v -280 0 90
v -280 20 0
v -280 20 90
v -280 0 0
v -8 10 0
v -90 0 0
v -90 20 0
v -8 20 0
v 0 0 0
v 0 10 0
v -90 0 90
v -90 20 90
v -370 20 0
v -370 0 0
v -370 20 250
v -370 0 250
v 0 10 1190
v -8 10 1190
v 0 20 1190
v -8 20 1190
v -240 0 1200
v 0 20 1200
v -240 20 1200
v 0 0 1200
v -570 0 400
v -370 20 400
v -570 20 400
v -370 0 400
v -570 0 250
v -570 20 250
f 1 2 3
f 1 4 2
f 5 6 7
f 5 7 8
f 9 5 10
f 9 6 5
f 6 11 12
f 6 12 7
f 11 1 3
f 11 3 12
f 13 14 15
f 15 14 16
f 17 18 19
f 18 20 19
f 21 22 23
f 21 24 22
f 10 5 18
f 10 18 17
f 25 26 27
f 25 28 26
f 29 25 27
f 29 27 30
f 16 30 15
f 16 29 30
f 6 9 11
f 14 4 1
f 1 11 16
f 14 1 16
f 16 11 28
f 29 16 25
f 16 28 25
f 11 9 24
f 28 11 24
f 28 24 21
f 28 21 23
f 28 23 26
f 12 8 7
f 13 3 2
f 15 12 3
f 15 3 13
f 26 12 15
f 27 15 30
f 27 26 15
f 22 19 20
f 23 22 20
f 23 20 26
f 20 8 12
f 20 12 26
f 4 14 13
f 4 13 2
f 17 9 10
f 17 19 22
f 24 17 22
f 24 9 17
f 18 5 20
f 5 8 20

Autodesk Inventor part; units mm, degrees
ref_plane "YZ Plane" through (0, 0, 0) normal (1, 0, 0) x (0, 1, 0)
ref_plane "XZ Plane" through (0, 0, 0) normal (0, 1, 0) x (-1, 0, 0)
ref_plane "XY Plane" through (0, 0, 0) normal (0, 0, 1) x (1, 0, 0)
sketch "Sketch1" plane through (0, 0, 0) normal (0, 1, 0) x (-1, 0, 0)
  line L0 (0, 0) -> (0, 1200)
  line L1 (0, 1200) -> (240, 1200)
  line L2 (370, 400) -> (570, 400)
  line L3 (240, 1200) -> (370, 400)
  line L4 (570, 400) -> (570, 250)
  line L5 (570, 250) -> (370, 250)
  line L6 (370, 0) -> (370, 250)
  line L7 (370, 0) -> (280, 0)
  line L8 (280, 0) -> (280, 90)
  line L9 (280, 90) -> (90, 90)
  line L10 (90, 90) -> (90, 0)
  line L11 (90, 0) -> (0, 0)
  dimension "d2" = 1200
  dimension "d4" = 200
  dimension "d8" = 370
  dimension "d9" = 150
  dimension "d10" = 250
  dimension "d11" = 90
  dimension "d12" = 90
  dimension "d13" = 190
  dimension "d14" = 240
extrude "Extrusion1" add sketch "Sketch1" along normal blind 20
sketch "Sketch2" plane through (0, 0, 0) normal (0, -1, 0) x (1, 0, 0)
  line L0 (0, 0) -> (0, 1200) projected
  line L1 (0, 1200) -> (-240, 1200) projected
  line L2 (-240, 1200) -> (-240, 400) projected
  line L3 (-370, 400) -> (-570, 400) projected
  line L4 (-570, 400) -> (-570, 0) projected
  line L5 (-570, 0) -> (0, 0) projected
sketch "Sketch3" plane through (0, 0, 0) normal (0, -1, 0) x (1, 0, 0)
  line L0 (0, 0) -> (0, 1200) projected
  line L1 (0, 1200) -> (-240, 1200) projected
  line L2 (-240, 1200) -> (-370, 400) projected
  line L3 (-370, 400) -> (-570, 400) projected
  line L4 (-570, 400) -> (-570, 250) projected
  line L5 (-570, 250) -> (-370, 250) projected
  line L6 (-370, 250) -> (-370, 0) projected
  line L7 (-370, 0) -> (-280, 0) projected
  line L8 (-280, 0) -> (-280, 90) projected
  line L9 (-280, 90) -> (-90, 90) projected
  line L10 (-90, 90) -> (-90, 0) projected
  line L11 (-90, 0) -> (0, 0) projected
sketch "Sketch5" plane through (0, 20, 0) normal (0, 1, 0) x (1, 0, 0)
  line L0 (-8, -1190) -> (0, -1190)
  line L1 (0, 0) -> (-8, 0)
  line L2 (-8, 0) -> (-8, -1190)
  line L3 (-8, -1190) -> (0, -1190)
  line L4 (0, -1190) -> (0, 0)
  dimension "d18" = 8
  dimension "d21" = 8
  dimension "d22" = 1190
extrude "Extrusion3" cut sketch "Sketch5" against normal blind 10
properties part number "seitenteil"
